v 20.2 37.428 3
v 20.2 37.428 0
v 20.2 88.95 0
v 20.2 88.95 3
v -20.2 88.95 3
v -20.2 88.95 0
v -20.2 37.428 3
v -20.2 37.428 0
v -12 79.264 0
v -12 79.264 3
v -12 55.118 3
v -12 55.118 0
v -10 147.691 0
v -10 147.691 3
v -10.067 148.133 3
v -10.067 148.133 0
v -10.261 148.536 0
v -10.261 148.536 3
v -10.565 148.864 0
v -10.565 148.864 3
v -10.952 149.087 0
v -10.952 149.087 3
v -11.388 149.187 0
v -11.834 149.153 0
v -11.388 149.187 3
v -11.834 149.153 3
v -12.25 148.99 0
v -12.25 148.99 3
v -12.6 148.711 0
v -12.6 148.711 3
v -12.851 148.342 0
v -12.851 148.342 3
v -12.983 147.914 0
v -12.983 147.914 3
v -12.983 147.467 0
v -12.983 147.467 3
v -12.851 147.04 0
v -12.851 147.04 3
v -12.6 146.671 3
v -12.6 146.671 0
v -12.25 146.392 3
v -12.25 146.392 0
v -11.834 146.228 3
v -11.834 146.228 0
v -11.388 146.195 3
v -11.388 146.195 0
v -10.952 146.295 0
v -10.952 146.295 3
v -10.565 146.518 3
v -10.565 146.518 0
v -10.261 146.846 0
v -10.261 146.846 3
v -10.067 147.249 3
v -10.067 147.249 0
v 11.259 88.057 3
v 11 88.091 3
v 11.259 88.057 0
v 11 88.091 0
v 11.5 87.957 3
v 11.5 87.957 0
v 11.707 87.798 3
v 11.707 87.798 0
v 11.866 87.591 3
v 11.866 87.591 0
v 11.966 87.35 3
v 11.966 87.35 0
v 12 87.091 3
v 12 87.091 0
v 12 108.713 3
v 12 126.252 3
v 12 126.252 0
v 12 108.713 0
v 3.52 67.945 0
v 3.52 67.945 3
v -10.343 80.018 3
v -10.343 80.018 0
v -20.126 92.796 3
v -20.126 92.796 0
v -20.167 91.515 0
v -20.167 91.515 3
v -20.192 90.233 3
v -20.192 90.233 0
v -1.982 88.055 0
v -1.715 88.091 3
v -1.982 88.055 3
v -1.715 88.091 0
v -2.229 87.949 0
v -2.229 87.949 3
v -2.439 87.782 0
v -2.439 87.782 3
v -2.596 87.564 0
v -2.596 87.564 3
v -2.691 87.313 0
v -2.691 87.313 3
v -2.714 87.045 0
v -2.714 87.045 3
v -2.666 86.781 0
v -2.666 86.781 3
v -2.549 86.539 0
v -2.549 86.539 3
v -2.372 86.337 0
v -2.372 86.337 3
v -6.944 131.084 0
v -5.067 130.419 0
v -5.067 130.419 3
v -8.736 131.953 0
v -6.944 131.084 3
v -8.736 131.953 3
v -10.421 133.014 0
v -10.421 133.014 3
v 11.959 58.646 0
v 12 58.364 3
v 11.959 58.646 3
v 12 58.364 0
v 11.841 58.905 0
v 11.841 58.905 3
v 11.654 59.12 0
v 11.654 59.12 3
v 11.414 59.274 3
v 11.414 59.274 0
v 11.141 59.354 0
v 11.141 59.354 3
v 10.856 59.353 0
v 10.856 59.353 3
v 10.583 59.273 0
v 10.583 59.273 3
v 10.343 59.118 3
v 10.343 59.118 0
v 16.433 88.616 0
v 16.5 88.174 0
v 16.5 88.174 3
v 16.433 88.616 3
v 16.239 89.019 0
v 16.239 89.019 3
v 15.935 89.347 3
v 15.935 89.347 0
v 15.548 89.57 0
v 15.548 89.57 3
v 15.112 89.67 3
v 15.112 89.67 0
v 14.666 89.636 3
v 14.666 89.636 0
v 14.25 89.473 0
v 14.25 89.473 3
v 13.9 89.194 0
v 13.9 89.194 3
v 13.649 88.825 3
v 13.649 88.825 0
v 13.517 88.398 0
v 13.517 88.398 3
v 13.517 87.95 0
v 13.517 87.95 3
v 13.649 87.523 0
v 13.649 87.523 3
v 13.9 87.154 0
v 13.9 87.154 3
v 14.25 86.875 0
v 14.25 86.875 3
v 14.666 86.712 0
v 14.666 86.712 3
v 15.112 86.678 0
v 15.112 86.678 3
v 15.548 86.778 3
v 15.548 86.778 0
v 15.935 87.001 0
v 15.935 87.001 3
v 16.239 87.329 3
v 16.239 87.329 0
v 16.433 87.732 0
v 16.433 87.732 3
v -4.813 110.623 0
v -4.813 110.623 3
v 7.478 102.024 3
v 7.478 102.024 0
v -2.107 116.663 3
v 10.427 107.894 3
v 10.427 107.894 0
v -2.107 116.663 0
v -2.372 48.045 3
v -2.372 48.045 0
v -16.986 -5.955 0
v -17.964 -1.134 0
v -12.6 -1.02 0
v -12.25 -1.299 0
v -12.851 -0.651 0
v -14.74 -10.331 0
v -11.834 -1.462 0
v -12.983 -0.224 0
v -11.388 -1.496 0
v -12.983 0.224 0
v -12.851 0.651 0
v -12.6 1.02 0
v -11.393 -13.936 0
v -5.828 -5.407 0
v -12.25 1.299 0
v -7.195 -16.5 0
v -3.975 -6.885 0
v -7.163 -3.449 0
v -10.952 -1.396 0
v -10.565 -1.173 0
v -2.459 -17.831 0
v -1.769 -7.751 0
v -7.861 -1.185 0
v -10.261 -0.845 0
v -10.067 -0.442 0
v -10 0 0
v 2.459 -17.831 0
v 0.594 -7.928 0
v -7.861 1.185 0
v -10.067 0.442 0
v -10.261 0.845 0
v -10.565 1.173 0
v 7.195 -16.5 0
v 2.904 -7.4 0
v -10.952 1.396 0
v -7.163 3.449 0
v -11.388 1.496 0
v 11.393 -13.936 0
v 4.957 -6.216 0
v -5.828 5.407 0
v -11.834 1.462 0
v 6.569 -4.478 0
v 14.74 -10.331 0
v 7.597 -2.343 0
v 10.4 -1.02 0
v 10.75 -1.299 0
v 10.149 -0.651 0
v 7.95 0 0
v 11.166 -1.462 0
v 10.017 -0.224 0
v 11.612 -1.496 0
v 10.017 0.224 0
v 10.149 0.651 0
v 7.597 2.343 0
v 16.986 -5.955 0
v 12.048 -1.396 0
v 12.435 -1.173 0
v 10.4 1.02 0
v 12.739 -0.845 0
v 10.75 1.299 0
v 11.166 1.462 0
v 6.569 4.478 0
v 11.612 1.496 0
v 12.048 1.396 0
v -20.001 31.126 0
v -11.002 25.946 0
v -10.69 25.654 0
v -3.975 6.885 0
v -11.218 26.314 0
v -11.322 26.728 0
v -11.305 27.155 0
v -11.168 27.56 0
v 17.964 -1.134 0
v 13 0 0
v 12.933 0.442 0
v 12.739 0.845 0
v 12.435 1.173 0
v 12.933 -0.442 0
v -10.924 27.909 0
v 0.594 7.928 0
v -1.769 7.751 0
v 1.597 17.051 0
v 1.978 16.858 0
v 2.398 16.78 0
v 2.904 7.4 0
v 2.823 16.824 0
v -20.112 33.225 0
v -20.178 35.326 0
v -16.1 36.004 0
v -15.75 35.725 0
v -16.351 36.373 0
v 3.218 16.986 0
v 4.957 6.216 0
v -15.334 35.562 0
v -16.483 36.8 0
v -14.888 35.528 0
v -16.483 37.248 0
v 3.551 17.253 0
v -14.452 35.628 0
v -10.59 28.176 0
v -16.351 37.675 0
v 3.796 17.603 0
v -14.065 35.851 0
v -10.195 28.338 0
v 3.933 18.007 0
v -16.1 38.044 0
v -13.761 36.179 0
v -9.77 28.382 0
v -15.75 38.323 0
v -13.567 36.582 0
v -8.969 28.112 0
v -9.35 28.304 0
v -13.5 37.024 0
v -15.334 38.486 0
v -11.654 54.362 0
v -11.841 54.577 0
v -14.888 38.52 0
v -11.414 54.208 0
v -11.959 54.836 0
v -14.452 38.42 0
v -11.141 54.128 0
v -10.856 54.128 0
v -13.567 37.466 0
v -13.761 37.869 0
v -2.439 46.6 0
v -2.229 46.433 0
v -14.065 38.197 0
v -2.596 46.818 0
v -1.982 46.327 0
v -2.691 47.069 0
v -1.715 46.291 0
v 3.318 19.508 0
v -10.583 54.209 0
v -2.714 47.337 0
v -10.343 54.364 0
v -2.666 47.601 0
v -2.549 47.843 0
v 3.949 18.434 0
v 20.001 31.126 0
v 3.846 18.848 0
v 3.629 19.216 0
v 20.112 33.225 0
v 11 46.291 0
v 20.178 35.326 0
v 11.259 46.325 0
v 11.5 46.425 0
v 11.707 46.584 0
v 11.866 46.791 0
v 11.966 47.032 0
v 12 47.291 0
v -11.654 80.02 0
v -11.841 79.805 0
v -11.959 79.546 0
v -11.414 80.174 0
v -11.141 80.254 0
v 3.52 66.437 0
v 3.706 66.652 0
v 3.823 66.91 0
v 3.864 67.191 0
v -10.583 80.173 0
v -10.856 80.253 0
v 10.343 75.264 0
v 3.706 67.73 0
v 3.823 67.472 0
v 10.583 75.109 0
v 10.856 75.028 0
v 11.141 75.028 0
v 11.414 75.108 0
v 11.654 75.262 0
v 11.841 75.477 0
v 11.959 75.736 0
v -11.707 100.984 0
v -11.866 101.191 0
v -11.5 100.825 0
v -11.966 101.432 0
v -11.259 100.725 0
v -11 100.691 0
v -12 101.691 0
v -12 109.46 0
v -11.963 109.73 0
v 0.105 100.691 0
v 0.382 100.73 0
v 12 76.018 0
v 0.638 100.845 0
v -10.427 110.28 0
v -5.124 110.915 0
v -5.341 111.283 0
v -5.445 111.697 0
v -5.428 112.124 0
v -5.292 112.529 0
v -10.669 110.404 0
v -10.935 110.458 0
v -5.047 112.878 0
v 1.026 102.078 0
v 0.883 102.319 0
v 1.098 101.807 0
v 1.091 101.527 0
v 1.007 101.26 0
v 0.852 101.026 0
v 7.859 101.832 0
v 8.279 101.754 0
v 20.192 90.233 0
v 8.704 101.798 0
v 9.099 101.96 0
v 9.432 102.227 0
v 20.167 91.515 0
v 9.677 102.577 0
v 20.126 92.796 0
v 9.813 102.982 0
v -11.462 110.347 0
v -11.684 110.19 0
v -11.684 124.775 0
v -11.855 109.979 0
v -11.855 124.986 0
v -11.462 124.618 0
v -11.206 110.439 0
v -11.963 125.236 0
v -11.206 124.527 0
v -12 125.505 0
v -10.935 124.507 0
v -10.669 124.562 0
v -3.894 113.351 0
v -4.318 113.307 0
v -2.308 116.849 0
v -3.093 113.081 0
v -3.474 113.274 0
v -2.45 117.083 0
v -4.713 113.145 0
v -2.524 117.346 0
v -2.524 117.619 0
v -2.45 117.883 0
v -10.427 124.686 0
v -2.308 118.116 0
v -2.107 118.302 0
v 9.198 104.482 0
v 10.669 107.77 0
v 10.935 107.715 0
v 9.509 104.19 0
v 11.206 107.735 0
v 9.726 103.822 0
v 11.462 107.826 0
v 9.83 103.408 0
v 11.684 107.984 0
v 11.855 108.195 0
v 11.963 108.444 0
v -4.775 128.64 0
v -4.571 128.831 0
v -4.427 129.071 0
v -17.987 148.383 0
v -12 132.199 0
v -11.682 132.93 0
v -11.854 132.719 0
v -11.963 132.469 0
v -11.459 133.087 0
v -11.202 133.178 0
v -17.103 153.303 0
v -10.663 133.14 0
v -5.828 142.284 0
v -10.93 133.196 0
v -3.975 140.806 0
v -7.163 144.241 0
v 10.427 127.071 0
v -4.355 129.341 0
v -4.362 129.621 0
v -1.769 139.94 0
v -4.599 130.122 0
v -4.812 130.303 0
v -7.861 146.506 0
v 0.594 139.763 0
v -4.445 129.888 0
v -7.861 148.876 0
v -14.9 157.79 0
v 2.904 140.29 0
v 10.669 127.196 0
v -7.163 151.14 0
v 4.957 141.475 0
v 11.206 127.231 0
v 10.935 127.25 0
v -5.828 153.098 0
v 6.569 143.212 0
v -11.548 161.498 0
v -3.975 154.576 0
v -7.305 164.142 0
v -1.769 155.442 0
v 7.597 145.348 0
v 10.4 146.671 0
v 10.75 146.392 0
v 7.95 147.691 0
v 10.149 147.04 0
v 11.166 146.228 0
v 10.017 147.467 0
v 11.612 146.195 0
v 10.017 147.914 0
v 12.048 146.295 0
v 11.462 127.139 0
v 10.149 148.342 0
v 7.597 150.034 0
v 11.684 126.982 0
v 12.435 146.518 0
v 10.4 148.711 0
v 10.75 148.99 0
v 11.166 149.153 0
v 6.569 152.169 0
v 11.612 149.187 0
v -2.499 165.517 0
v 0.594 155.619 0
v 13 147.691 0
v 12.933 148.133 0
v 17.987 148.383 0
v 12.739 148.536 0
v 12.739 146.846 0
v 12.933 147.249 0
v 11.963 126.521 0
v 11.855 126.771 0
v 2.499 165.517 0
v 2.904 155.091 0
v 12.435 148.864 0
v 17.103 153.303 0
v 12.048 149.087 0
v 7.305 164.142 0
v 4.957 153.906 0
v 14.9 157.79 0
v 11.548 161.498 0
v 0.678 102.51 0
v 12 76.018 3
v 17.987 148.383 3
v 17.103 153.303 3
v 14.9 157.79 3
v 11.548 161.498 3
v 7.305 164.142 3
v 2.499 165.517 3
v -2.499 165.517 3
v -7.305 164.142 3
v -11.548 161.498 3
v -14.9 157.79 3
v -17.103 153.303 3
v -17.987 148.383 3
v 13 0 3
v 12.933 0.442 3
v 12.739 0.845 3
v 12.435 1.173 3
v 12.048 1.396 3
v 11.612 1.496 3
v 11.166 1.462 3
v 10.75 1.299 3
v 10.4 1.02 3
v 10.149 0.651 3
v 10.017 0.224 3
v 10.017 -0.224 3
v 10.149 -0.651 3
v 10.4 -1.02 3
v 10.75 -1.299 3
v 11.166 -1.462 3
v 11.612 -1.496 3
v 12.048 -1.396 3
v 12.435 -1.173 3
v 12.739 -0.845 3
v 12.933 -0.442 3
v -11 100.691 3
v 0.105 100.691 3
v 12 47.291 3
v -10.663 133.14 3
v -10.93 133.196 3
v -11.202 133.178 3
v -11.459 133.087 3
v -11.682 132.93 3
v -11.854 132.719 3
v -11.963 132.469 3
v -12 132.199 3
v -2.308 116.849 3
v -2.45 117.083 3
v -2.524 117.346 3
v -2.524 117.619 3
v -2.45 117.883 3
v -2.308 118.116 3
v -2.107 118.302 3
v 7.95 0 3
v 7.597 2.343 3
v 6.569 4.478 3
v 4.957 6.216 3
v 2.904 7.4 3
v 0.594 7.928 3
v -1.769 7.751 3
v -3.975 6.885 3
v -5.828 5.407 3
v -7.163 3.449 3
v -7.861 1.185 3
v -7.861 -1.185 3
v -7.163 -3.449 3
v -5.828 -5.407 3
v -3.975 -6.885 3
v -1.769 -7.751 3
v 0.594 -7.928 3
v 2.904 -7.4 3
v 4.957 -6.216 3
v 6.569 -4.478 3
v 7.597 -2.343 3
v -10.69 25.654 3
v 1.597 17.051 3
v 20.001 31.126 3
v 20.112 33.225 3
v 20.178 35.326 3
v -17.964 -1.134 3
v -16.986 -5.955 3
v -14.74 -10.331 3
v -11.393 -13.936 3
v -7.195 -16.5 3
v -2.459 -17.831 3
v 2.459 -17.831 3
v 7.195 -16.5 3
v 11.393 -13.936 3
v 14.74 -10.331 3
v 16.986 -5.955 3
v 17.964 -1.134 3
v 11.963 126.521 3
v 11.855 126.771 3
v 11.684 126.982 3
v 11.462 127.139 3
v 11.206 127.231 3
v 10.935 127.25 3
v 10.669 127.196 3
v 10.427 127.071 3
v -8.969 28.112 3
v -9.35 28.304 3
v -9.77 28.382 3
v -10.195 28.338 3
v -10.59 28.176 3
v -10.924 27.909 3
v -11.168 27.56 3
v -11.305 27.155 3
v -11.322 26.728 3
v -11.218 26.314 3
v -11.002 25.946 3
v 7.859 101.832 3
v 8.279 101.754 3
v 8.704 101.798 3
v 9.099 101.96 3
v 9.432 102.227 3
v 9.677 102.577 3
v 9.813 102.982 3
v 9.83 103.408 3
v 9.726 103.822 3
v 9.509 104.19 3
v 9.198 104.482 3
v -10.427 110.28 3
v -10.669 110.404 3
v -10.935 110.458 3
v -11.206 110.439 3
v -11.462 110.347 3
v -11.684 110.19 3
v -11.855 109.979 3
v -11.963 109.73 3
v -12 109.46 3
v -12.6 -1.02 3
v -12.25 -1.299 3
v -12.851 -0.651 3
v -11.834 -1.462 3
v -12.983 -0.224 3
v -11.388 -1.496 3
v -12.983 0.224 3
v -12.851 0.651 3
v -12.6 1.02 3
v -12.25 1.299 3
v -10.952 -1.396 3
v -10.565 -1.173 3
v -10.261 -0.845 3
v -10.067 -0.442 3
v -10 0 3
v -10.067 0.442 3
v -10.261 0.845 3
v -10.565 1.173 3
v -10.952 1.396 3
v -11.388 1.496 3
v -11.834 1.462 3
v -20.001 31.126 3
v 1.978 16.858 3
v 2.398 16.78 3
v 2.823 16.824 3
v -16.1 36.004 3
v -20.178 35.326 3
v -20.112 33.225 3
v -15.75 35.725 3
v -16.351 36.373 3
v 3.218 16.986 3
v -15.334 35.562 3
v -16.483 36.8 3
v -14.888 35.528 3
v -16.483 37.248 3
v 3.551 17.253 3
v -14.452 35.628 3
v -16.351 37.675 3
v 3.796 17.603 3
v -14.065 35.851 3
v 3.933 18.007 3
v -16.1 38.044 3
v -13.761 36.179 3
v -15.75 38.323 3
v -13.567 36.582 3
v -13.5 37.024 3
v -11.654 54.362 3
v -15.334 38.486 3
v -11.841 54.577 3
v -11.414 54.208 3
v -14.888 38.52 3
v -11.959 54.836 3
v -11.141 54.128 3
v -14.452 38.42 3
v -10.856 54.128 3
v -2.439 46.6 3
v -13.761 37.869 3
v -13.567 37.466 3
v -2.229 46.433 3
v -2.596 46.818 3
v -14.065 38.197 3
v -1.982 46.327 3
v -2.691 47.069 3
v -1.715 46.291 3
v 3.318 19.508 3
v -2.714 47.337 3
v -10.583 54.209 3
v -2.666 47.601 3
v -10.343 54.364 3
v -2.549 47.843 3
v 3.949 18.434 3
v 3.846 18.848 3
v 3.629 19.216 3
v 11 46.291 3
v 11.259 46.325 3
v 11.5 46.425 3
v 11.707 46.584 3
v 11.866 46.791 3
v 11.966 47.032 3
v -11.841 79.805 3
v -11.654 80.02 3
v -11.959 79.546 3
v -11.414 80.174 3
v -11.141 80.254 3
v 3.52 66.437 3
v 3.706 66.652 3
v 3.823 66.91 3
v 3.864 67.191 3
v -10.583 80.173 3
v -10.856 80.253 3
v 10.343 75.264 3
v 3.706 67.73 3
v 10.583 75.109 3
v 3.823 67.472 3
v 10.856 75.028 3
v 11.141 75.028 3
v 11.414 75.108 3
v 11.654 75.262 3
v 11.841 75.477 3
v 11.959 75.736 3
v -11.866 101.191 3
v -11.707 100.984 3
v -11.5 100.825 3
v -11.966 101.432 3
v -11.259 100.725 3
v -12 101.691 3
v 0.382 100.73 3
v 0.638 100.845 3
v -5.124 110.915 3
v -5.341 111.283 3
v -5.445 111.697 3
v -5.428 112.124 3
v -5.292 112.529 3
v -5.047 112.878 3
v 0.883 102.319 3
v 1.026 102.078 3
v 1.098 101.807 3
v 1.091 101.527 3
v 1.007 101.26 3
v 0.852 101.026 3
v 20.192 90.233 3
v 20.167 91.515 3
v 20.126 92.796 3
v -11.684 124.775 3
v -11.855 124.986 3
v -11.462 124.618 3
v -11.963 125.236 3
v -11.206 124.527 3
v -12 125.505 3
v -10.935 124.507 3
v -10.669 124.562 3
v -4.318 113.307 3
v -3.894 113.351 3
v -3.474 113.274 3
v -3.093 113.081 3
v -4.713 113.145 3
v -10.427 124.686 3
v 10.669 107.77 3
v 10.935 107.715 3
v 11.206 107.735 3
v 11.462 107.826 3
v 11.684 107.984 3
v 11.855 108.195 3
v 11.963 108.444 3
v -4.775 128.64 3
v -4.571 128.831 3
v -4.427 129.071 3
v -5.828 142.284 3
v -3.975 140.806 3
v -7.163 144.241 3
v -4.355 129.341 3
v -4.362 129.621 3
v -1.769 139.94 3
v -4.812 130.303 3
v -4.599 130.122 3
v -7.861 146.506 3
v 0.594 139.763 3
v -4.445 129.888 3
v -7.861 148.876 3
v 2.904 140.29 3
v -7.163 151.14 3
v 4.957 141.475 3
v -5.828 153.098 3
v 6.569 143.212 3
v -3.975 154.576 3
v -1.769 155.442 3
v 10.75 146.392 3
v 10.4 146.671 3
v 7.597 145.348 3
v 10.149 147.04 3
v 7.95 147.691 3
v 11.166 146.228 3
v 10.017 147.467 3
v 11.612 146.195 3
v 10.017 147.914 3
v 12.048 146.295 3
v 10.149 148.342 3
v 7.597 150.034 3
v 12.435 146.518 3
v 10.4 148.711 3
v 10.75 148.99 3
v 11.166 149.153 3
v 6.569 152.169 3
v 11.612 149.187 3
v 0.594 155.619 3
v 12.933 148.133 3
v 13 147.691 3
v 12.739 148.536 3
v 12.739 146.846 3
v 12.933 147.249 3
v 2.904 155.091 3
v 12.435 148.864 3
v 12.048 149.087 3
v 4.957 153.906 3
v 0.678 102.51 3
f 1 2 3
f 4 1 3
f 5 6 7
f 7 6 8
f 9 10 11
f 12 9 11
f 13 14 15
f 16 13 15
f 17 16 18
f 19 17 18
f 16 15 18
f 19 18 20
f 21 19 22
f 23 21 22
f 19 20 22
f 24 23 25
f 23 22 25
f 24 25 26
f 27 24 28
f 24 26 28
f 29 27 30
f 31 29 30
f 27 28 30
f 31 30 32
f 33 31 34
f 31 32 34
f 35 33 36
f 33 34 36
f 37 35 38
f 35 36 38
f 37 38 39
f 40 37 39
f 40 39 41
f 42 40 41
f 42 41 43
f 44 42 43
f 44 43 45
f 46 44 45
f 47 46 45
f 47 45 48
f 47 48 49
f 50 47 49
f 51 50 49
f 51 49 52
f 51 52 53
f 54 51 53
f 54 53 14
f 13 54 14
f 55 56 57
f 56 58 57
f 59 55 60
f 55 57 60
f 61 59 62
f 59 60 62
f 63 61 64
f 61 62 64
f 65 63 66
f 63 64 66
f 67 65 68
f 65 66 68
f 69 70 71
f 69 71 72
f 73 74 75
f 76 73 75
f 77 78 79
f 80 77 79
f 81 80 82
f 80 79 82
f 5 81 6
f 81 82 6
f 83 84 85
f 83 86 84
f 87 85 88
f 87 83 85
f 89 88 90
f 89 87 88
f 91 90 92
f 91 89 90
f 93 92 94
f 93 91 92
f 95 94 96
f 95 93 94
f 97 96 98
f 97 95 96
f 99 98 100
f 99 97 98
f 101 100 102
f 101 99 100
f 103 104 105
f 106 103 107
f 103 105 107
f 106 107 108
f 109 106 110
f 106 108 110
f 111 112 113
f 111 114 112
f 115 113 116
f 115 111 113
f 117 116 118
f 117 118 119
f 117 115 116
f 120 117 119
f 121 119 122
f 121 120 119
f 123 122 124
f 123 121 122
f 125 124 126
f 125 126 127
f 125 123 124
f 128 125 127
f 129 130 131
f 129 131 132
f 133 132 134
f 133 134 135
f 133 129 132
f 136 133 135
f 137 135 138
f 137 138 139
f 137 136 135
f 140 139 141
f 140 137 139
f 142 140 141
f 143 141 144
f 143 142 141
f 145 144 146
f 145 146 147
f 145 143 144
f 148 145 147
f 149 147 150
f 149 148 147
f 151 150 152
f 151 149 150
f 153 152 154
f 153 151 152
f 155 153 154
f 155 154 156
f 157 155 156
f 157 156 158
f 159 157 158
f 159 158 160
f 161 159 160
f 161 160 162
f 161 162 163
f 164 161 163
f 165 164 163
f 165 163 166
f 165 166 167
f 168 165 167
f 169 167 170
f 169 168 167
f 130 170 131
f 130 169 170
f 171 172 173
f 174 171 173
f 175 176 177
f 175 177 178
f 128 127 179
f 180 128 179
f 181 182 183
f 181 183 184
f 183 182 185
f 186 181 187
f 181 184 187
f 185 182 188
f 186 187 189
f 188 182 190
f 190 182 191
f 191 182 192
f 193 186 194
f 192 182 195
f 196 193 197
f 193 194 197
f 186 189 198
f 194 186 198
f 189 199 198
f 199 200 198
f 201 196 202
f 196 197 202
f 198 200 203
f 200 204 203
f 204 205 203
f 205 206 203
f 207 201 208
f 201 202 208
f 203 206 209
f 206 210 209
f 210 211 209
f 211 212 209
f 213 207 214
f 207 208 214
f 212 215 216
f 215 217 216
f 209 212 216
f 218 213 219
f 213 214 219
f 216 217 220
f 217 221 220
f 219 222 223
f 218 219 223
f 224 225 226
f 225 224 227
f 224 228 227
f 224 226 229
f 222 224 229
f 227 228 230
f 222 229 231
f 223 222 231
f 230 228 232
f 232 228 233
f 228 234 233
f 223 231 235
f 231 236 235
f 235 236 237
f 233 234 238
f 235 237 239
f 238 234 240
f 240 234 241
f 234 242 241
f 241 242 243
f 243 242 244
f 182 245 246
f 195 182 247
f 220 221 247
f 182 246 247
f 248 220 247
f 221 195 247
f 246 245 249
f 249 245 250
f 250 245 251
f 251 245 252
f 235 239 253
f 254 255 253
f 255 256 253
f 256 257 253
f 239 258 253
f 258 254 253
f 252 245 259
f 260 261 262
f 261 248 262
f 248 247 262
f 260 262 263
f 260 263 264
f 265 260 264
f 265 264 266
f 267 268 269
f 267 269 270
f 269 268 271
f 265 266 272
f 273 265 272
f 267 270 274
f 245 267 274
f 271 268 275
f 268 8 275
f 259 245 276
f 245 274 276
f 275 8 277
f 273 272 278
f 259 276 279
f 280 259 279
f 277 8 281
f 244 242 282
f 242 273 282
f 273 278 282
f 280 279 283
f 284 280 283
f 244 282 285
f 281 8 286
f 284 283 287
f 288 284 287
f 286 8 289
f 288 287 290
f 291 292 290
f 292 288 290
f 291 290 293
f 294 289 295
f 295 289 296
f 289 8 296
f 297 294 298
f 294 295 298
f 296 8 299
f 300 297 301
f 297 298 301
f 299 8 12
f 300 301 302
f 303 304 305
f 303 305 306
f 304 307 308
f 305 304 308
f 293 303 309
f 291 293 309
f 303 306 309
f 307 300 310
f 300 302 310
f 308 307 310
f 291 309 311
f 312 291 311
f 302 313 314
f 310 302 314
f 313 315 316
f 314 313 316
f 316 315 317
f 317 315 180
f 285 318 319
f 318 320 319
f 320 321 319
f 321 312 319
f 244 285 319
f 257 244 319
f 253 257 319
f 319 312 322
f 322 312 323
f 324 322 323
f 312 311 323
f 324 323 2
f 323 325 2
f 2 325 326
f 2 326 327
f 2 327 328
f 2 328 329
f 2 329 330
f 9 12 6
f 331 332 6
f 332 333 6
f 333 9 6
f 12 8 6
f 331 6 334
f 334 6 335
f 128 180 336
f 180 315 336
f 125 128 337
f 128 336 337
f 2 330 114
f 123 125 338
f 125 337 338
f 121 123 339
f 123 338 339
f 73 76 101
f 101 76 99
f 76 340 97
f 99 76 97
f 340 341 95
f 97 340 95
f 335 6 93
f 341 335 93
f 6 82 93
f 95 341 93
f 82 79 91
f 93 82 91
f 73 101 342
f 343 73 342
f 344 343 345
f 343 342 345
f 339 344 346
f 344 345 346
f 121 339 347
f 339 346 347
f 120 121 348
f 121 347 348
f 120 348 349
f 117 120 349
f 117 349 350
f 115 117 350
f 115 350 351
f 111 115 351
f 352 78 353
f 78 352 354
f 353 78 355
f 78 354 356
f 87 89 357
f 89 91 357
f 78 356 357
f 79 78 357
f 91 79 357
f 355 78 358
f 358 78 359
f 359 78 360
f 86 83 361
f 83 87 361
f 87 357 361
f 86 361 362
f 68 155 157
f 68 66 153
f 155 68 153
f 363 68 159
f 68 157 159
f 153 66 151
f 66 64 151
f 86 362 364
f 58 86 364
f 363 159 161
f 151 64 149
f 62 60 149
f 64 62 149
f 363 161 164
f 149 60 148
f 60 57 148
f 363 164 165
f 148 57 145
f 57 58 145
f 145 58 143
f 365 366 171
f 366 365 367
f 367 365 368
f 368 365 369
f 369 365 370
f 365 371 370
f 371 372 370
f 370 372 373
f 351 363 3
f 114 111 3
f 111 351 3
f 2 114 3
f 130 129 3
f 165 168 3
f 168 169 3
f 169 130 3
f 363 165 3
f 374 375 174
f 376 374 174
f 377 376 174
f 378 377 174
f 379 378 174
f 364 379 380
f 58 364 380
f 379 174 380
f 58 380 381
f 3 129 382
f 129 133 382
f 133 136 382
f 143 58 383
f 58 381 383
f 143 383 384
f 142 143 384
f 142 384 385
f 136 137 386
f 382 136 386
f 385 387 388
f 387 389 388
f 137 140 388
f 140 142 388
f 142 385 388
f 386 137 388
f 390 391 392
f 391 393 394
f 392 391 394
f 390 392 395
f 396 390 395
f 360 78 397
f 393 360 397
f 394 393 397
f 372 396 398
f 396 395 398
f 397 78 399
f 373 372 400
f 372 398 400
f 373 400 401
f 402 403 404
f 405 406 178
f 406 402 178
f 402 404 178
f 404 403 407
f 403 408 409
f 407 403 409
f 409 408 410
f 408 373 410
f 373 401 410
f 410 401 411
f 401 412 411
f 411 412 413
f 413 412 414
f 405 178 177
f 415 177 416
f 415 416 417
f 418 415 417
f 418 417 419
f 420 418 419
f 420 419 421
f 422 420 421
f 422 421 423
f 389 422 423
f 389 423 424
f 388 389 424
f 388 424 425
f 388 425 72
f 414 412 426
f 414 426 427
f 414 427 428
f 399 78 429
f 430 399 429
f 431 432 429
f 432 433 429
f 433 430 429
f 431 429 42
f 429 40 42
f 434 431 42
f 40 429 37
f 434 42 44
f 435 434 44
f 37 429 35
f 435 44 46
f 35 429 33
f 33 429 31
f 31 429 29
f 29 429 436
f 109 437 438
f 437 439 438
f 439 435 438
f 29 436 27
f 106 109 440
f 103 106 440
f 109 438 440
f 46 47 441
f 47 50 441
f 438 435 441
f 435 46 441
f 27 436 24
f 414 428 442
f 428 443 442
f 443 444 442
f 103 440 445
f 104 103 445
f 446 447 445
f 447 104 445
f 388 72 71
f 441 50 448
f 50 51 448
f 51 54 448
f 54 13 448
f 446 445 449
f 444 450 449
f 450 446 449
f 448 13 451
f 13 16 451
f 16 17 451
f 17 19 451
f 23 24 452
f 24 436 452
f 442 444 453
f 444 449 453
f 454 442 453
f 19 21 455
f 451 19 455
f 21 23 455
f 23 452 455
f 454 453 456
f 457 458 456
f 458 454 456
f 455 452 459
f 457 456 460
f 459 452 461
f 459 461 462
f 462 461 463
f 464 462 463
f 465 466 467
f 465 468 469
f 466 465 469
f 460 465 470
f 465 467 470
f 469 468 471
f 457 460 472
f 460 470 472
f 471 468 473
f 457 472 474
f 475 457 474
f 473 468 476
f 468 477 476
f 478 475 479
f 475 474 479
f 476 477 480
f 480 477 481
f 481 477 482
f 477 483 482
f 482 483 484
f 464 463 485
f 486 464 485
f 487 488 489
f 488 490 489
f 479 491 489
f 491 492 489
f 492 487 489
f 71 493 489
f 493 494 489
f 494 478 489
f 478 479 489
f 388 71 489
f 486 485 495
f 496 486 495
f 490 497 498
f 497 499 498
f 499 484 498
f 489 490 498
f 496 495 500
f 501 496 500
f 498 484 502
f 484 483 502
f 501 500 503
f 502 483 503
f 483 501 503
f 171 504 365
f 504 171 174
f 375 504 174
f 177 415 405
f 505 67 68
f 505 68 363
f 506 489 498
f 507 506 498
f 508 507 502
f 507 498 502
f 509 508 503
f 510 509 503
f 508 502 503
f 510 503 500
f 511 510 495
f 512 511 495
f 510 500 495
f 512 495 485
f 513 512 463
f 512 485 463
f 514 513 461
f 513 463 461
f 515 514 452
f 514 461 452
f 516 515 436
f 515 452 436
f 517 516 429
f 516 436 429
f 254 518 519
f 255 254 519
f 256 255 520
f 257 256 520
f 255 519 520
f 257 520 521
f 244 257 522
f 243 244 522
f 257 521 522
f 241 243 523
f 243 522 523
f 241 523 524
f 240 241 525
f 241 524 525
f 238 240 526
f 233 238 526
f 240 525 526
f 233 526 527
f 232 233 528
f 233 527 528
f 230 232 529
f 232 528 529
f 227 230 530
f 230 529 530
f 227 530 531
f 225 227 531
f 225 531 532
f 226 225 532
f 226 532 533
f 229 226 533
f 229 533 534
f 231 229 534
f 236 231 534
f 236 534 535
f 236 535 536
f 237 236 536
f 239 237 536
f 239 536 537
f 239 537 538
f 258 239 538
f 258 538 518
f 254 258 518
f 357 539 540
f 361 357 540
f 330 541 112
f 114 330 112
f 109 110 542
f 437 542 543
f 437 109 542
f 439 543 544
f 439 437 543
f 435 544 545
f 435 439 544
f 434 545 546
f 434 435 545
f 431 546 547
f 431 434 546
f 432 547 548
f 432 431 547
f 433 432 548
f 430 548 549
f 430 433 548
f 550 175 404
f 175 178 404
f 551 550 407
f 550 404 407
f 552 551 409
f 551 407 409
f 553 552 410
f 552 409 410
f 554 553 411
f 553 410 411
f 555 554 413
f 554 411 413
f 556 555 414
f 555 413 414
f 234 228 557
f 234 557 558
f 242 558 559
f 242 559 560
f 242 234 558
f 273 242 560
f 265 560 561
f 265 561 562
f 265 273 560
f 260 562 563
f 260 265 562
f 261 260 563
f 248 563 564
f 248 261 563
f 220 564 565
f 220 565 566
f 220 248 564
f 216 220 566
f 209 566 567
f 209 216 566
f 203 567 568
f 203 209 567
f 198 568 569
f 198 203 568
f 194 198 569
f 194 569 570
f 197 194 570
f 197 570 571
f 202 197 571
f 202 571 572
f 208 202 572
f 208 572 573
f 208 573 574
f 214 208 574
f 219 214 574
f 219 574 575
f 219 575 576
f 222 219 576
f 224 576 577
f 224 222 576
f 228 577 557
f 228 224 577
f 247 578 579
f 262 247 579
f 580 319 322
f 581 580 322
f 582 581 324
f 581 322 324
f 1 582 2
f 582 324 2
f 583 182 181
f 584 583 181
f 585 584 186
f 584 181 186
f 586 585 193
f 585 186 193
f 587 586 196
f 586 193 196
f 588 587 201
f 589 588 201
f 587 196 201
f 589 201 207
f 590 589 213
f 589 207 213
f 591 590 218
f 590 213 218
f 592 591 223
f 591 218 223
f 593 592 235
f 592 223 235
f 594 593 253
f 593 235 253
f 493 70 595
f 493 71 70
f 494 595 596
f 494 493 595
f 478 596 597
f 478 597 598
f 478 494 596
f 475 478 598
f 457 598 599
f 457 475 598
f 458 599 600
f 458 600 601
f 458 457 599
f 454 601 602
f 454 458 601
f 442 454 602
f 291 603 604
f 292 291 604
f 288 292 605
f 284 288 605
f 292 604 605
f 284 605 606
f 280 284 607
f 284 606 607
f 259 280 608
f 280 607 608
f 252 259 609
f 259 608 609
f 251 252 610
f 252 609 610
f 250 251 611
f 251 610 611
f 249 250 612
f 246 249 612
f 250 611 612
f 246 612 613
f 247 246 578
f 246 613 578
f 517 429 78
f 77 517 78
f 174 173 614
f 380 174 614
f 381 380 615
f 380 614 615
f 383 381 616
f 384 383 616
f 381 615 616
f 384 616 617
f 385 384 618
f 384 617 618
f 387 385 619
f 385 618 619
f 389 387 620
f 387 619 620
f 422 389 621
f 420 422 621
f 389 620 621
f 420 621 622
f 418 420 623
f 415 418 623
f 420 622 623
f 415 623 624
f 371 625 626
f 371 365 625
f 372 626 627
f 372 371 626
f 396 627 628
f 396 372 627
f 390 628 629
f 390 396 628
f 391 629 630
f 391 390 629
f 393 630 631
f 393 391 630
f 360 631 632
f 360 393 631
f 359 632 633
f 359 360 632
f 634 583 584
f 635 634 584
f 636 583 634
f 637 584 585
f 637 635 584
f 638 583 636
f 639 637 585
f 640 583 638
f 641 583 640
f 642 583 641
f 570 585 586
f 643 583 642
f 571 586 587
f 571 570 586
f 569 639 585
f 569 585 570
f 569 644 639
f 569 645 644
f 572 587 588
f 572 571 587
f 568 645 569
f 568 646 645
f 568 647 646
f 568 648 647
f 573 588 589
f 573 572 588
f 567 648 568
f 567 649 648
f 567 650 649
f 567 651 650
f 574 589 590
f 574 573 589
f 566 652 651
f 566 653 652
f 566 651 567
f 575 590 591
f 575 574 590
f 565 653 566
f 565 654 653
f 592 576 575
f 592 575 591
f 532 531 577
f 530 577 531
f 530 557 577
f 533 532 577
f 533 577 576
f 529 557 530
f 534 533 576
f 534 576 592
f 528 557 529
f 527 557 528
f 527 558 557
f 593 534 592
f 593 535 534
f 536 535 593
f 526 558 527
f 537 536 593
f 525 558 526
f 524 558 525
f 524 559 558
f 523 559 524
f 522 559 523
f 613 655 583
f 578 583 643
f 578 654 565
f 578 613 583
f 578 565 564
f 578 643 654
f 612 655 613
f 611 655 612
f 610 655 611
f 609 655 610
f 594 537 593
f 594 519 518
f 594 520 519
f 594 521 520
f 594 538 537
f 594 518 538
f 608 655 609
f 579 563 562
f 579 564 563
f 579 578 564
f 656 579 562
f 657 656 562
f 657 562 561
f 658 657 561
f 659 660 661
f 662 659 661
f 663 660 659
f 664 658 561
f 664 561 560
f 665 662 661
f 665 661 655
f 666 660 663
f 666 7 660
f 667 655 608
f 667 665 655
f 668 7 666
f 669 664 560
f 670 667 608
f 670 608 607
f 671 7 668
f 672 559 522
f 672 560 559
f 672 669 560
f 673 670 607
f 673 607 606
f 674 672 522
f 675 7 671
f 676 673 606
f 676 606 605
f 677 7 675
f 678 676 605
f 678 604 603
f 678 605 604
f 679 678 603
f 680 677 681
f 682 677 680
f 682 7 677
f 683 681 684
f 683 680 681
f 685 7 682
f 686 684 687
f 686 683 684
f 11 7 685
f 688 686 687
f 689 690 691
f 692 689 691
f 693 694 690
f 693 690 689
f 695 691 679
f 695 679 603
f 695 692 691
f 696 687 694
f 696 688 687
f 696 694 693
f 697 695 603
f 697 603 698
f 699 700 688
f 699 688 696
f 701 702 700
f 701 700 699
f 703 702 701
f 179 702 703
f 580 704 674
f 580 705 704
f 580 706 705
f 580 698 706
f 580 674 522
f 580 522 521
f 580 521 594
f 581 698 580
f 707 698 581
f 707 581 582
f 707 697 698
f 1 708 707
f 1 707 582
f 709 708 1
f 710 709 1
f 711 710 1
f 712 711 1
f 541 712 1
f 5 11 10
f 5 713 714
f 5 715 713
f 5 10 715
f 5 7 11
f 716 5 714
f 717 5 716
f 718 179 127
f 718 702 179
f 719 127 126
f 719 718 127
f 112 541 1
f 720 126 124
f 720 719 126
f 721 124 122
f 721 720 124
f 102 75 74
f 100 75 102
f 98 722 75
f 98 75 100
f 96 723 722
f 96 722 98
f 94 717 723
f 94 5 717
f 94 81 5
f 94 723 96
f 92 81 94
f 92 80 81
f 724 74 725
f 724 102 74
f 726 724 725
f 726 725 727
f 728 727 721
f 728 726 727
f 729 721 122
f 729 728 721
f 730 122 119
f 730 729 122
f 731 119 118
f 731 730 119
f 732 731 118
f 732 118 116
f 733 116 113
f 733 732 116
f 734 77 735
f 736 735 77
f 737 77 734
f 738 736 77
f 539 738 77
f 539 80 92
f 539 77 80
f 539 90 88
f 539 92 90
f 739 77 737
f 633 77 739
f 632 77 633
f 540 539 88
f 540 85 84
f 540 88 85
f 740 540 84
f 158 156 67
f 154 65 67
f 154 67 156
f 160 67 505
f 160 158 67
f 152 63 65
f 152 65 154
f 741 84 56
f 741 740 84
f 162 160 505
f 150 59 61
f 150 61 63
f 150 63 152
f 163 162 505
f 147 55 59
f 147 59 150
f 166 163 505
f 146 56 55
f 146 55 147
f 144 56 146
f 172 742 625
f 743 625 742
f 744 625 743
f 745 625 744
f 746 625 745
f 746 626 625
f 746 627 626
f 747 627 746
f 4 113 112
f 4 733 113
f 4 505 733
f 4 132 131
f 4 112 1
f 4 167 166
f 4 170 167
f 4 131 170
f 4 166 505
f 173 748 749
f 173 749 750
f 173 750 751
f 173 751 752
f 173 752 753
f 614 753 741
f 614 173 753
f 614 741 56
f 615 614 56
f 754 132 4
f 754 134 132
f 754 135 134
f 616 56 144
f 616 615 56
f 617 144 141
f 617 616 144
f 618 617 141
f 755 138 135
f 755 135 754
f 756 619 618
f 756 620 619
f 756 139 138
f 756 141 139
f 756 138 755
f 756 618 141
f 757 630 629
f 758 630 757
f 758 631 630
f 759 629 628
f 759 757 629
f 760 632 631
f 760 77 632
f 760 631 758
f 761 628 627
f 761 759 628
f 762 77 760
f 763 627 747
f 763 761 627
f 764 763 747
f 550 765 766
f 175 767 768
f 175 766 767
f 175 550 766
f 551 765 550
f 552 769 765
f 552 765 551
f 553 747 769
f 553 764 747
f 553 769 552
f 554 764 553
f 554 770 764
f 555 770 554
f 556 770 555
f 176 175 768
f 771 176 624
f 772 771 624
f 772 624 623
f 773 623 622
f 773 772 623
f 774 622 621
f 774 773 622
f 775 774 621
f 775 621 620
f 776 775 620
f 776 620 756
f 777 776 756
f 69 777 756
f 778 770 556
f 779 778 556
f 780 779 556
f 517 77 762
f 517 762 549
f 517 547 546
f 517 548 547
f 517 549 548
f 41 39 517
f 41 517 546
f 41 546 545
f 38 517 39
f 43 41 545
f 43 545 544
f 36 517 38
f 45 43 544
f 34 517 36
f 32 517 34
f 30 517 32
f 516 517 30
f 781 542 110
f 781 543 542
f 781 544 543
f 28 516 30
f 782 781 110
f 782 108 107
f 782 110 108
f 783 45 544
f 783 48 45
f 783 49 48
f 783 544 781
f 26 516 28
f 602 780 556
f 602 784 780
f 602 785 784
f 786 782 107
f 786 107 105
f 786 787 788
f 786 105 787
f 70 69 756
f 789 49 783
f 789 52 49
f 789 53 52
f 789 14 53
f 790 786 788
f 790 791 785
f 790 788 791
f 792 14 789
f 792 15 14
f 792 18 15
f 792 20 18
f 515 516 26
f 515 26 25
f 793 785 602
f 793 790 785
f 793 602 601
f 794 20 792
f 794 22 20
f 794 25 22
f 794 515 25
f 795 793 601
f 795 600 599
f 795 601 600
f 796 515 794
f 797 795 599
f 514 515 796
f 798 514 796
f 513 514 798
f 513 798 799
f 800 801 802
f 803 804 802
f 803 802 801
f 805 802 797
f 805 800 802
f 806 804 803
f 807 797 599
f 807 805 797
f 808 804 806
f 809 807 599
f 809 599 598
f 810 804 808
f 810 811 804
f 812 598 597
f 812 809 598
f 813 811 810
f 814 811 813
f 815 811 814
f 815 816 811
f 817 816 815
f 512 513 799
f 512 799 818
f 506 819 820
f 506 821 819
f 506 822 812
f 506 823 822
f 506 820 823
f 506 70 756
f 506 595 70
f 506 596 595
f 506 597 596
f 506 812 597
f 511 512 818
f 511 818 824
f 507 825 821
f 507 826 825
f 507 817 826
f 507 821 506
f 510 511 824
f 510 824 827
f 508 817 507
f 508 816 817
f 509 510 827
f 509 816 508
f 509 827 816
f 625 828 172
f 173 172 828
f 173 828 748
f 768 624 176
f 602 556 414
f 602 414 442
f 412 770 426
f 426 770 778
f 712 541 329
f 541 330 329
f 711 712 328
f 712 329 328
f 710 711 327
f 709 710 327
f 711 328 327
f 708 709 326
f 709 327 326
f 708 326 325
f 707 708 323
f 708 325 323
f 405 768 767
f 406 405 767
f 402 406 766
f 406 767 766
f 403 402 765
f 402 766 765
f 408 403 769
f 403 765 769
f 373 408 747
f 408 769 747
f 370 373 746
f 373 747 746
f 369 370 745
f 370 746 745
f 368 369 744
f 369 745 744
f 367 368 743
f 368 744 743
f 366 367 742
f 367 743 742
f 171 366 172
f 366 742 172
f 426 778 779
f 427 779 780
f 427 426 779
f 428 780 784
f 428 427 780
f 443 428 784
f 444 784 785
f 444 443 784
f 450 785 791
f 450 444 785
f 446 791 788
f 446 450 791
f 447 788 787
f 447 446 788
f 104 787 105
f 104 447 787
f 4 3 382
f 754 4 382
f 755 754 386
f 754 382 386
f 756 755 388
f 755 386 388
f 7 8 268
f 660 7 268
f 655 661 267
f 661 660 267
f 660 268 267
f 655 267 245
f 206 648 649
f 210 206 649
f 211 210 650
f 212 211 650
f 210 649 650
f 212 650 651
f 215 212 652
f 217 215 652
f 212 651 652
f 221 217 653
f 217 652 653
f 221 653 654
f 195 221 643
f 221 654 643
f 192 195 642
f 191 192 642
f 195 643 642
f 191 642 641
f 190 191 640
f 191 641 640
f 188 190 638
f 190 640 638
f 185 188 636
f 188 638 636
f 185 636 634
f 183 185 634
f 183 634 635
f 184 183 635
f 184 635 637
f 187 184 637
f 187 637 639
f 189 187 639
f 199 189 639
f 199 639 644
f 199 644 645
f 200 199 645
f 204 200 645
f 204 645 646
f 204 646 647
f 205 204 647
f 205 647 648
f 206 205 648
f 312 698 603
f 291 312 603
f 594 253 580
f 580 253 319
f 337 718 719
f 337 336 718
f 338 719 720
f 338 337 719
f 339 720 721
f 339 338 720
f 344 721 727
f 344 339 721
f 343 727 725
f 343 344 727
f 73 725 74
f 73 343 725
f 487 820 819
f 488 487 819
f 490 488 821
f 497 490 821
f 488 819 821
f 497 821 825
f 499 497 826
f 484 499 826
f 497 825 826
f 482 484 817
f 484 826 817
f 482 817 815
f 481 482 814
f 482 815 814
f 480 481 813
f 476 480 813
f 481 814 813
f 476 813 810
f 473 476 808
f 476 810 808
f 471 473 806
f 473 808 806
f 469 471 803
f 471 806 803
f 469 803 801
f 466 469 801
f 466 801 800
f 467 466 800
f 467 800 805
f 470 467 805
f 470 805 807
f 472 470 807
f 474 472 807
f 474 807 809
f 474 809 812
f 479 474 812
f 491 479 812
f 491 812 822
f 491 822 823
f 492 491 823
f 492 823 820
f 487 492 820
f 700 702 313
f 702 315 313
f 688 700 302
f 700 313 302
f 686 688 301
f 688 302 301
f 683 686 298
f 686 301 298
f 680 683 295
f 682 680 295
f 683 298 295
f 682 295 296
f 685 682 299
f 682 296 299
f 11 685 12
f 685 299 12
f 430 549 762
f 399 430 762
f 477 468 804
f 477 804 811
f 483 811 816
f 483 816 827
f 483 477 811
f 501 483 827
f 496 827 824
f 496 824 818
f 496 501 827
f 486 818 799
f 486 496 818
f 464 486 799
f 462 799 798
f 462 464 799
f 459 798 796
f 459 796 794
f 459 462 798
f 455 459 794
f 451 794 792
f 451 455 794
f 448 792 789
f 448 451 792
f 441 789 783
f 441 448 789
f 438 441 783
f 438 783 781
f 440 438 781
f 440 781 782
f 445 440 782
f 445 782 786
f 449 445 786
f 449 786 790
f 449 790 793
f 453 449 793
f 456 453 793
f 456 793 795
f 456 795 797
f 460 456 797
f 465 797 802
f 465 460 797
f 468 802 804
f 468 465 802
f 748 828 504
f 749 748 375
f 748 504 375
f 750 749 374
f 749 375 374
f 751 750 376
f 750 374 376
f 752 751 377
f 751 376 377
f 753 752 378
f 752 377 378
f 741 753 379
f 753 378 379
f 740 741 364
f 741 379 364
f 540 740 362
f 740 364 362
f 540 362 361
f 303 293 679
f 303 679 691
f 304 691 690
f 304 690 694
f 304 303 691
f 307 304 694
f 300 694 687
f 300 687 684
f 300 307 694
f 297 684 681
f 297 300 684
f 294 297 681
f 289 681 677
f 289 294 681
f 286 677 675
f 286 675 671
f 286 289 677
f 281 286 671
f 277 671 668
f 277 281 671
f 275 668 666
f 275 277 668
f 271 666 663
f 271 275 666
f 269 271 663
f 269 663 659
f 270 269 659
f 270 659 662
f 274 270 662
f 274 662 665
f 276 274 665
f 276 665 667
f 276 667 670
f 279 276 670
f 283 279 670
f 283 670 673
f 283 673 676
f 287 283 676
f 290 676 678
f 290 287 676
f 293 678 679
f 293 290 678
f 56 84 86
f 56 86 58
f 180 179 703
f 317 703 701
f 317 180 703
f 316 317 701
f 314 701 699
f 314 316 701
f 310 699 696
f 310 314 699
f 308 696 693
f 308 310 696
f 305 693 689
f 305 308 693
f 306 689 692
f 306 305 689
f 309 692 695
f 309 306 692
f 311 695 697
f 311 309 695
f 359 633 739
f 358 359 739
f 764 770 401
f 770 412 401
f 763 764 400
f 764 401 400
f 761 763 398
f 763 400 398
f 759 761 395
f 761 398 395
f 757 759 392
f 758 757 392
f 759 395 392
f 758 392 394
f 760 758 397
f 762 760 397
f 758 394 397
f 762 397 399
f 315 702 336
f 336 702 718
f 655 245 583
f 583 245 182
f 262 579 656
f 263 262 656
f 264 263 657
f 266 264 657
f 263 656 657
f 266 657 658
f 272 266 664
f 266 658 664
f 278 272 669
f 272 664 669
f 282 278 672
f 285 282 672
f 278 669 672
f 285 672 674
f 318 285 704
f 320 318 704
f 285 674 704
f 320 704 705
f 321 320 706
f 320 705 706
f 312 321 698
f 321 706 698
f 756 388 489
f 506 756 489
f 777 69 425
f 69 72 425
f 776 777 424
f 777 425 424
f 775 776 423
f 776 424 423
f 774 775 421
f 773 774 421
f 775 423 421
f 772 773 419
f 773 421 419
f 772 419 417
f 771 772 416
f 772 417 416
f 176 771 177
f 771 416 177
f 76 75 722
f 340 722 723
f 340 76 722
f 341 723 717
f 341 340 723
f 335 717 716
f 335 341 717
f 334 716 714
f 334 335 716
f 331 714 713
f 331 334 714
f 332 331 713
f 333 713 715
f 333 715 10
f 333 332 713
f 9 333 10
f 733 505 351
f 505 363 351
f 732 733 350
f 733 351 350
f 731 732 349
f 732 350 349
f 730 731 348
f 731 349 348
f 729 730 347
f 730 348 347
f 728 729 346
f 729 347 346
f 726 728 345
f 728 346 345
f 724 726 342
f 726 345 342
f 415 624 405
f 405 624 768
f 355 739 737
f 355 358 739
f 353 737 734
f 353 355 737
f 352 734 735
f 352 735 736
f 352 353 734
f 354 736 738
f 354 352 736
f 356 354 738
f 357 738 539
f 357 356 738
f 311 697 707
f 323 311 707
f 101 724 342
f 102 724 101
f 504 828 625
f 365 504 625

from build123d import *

# Parameters (mm, degrees)
SKETCH1_R               = 7.95
SKETCH1_R_2             = 1.5
MAIN_BODY_LINK_B1_DEPTH = 3
CUT_EXTRUDE2_REACH      = 168.945
CUT_EXTRUDE3_REACH      = 168.945
SKETCH5_R               = 1.5
PULLEYIDLERUP_DEPTH     = 3
CUT_EXTRUDE5_DEPTH      = 3
FILLET4_R               = 1
FILLET5_R               = 100


with BuildPart() as part:
    # Sketch1 → Main Body Link B1 (new body)
    with BuildSketch(Plane.XY):
        with BuildLine():
            Line((20.2, 41.674052381), (20.2, 83.474052381))
            Line((20.2, 83.474052381), (20.2, 90.874052381))
            Line((20.2, 90.874052381), (17.986683974, 148.383116621))
            ThreePointArc((17.986683974, 148.383116621), (0, 165.690874165), (-17.986683974, 148.383116621))
            Line((-17.986683974, 148.383116621), (-20.2, 90.874052381))
            Line((-20.2, 90.874052381), (-20.2, 83.474052381))
            Line((-20.2, 83.474052381), (-20.2, 41.674052381))
            Line((-20.2, 41.674052381), (-20.2, 34.274052381))
            Line((-20.2, 34.274052381), (-17.964224051, -1.134307826))
            ThreePointArc((-17.964224051, -1.134307826), (0, -18), (17.964224051, -1.134307826))
            Line((17.964224051, -1.134307826), (20.2, 34.274052381))
            Line((20.2, 34.274052381), (20.2, 41.674052381))
        make_face()
        Circle(SKETCH1_R, mode=Mode.SUBTRACT)
        with Locations((15, 88.174052381)):
            Circle(SKETCH1_R_2, mode=Mode.SUBTRACT)
        with Locations((-15, 37.024052381)):
            Circle(SKETCH1_R_2, mode=Mode.SUBTRACT)
        with Locations((0, 147.690874165)):
            Circle(SKETCH1_R, mode=Mode.SUBTRACT)
    extrude(amount=MAIN_BODY_LINK_B1_DEPTH)

    # Sketch4 → Cut-Extrude2 (cut, up to next)
    with BuildSketch(Plane.XY.offset(3), mode=Mode.PRIVATE) as cut_extrude2_sk1:
        with BuildLine():
            Line((-12, 134.2744663), (-12, 123.584968066))
            Line((-12, 123.584968066), (-2.929911079, 129.930929878))
            ThreePointArc((-2.929911079, 129.930929878), (-7.774454217, 131.456408925), (-12, 134.2744663))
        make_face()
    cut_extrude2_tool1 = extrude(cut_extrude2_sk1.sketch, amount=-CUT_EXTRUDE2_REACH, mode=Mode.PRIVATE) & part.part
    # Sketch4 → Cut-Extrude2 (cut, up to next)
    with BuildSketch(Plane.XY.offset(3), mode=Mode.PRIVATE) as cut_extrude2_sk2:
        Polygon((-12, 100.690874165), (3.278172542, 100.690874165), (-12, 111.380372399), align=None)
    cut_extrude2_tool2 = extrude(cut_extrude2_sk2.sketch, amount=-CUT_EXTRUDE2_REACH, mode=Mode.PRIVATE) & part.part
    # Sketch4 → Cut-Extrude2 (cut, up to next)
    with BuildSketch(Plane.XY.offset(3), mode=Mode.PRIVATE) as cut_extrude2_sk3:
        Polygon((12, 128.172168466), (12, 106.793171999), (-3.278172542, 117.482670232), align=None)
    cut_extrude2_tool3 = extrude(cut_extrude2_sk3.sketch, amount=-CUT_EXTRUDE2_REACH, mode=Mode.PRIVATE) & part.part
    # Sketch4 → Cut-Extrude2 (cut, up to next)
    with BuildSketch(Plane.XY.offset(3), mode=Mode.PRIVATE) as cut_extrude2_sk4:
        Polygon((-4.386441158, 88.090874165), (12, 88.090874165), (12, 73.82101499), align=None)
    cut_extrude2_tool4 = extrude(cut_extrude2_sk4.sketch, amount=-CUT_EXTRUDE2_REACH, mode=Mode.PRIVATE) & part.part
    # Sketch4 → Cut-Extrude2 (cut, up to next)
    with BuildSketch(Plane.XY.offset(3), mode=Mode.PRIVATE) as cut_extrude2_sk5:
        Polygon((-12, 81.46073334), (-12, 52.92101499), (4.386441158, 67.190874165), align=None)
    cut_extrude2_tool5 = extrude(cut_extrude2_sk5.sketch, amount=-CUT_EXTRUDE2_REACH, mode=Mode.PRIVATE) & part.part
    # Sketch4 → Cut-Extrude2 (cut, up to next)
    with BuildSketch(Plane.XY.offset(3), mode=Mode.PRIVATE) as cut_extrude2_sk6:
        Polygon((-4.386441158, 46.290874165), (12, 46.290874165), (12, 60.56073334), align=None)
    cut_extrude2_tool6 = extrude(cut_extrude2_sk6.sketch, amount=-CUT_EXTRUDE2_REACH, mode=Mode.PRIVATE) & part.part
    add(cut_extrude2_tool1.solids().sort_by_distance((-9.12997, 128.978342, 3))[0], mode=Mode.SUBTRACT)
    add(cut_extrude2_tool2.solids().sort_by_distance((-6.907276, 104.25404, 3))[0], mode=Mode.SUBTRACT)
    add(cut_extrude2_tool3.solids().sort_by_distance((6.907276, 117.48267, 3))[0], mode=Mode.SUBTRACT)
    add(cut_extrude2_tool4.solids().sort_by_distance((6.537853, 83.334254, 3))[0], mode=Mode.SUBTRACT)
    add(cut_extrude2_tool5.solids().sort_by_distance((-6.537853, 67.190874, 3))[0], mode=Mode.SUBTRACT)
    add(cut_extrude2_tool6.solids().sort_by_distance((6.537853, 51.047494, 3))[0], mode=Mode.SUBTRACT)

    # Sketch5 → Cut-Extrude3 (cut, up to next)
    with BuildSketch(Plane.XY.offset(3), mode=Mode.PRIVATE) as cut_extrude3_sk1:
        with Locations((11.5, 147.690874165)):
            Circle(SKETCH5_R)
    cut_extrude3_tool1 = extrude(cut_extrude3_sk1.sketch, amount=-CUT_EXTRUDE3_REACH, mode=Mode.PRIVATE) & part.part
    # Sketch5 → Cut-Extrude3 (cut, up to next)
    with BuildSketch(Plane.XY.offset(3), mode=Mode.PRIVATE) as cut_extrude3_sk2:
        with Locations((-11.5, 147.690874165)):
            Circle(SKETCH5_R)
    cut_extrude3_tool2 = extrude(cut_extrude3_sk2.sketch, amount=-CUT_EXTRUDE3_REACH, mode=Mode.PRIVATE) & part.part
    # Sketch5 → Cut-Extrude3 (cut, up to next)
    with BuildSketch(Plane.XY.offset(3), mode=Mode.PRIVATE) as cut_extrude3_sk3:
        with Locations((-11.5, 0)):
            Circle(SKETCH5_R)
    cut_extrude3_tool3 = extrude(cut_extrude3_sk3.sketch, amount=-CUT_EXTRUDE3_REACH, mode=Mode.PRIVATE) & part.part
    # Sketch5 → Cut-Extrude3 (cut, up to next)
    with BuildSketch(Plane.XY.offset(3), mode=Mode.PRIVATE) as cut_extrude3_sk4:
        with Locations((11.5, 0)):
            Circle(SKETCH5_R)
    cut_extrude3_tool4 = extrude(cut_extrude3_sk4.sketch, amount=-CUT_EXTRUDE3_REACH, mode=Mode.PRIVATE) & part.part
    add(cut_extrude3_tool1.solids().sort_by_distance((11.5, 147.690874, 3))[0], mode=Mode.SUBTRACT)
    add(cut_extrude3_tool2.solids().sort_by_distance((-11.5, 147.690874, 3))[0], mode=Mode.SUBTRACT)
    add(cut_extrude3_tool3.solids().sort_by_distance((-11.5, 0, 3))[0], mode=Mode.SUBTRACT)
    add(cut_extrude3_tool4.solids().sort_by_distance((11.5, 0, 3))[0], mode=Mode.SUBTRACT)

    # Sketch6 → PulleyIdlerUp (cut)
    with BuildSketch(Plane.XY.offset(3)):
        with BuildLine():
            Line((-4.812543936, 110.623218529), (7.477908291, 102.024103222))
            ThreePointArc((7.477908291, 102.024103222), (9.566865044, 102.393236914), (9.197731352, 104.482193668))
            Line((9.197731352, 104.482193668), (-3.092720875, 113.081308975))
            ThreePointArc((-3.092720875, 113.081308975), (-5.181677628, 112.712175283), (-4.812543936, 110.623218529))
        make_face()
    extrude(amount=-PULLEYIDLERUP_DEPTH, mode=Mode.SUBTRACT)

    # Sketch7 → Cut-Extrude5 (cut)
    with BuildSketch(Plane.XY.offset(3)):
        with BuildLine():
            Line((-10.690189186, 25.65418917), (1.597091478, 17.050542625))
            ThreePointArc((1.597091478, 17.050542625), (3.686184199, 17.418906036), (3.317820787, 19.507998757))
            Line((3.317820787, 19.507998757), (-8.969459877, 28.111645303))
            ThreePointArc((-8.969459877, 28.111645303), (-11.058552598, 27.743281891), (-10.690189186, 25.65418917))
        make_face()
    extrude(amount=-CUT_EXTRUDE5_DEPTH, mode=Mode.SUBTRACT)

    # Fillet4
    fillet4_edges = [part.edges().sort_by_distance(p)[0] for p in [
        (-12, 81.46073334, 1.5),
        (4.386441158, 67.190874165, 1.5),
        (-12, 52.92101499, 1.5),
        (-12, 134.2744663, 1.5),
        (-2.929911079, 129.930929878, 1.5),
        (-12, 123.584968066, 1.5),
        (-12, 100.690874165, 1.5),
        (-12, 111.380372399, 1.5),
        (3.278172542, 100.690874165, 1.5),
        (12, 106.793171999, 1.5),
        (-3.278172542, 117.482670232, 1.5),
        (12, 128.172168466, 1.5),
        (12, 60.56073334, 1.5),
        (12, 46.290874165, 1.5),
        (-4.386441158, 46.290874165, 1.5),
        (12, 88.090874165, 1.5),
        (12, 73.82101499, 1.5),
        (-4.386441158, 88.090874165, 1.5),
    ]]
    fillet(fillet4_edges, radius=FILLET4_R)

    # Fillet5
    # the kernel refuses this fillet: 100 mm, written as the material it takes off along each edge
    with BuildSketch(Plane(origin=(-20.2, 34.274052381, -7.884973578), x_dir=(0, 1, 0), z_dir=(0, 0, 1))) as fillet5_piece_1:
        with BuildLine():
            CenterArc((FILLET5_R * 0.0315398943126, -FILLET5_R), FILLET5_R, 90, 3.613007947)
            Line((-FILLET5_R * 0.0314772071099, -FILLET5_R * 0.00198755271875), (0, 0))
            Line((0, 0), (FILLET5_R * 0.0315398943126, 0))
        make_face()
    extrude(amount=18.769947156, mode=Mode.SUBTRACT)
    with BuildSketch(Plane(origin=(-20.2, 90.874052381, -4.809018086), x_dir=(0.03845791424359976, 0.9992602207793684, 0), z_dir=(0, 0, 1))) as fillet5_piece_2:
        with BuildLine():
            CenterArc((FILLET5_R * 0.0192360723451, -FILLET5_R), FILLET5_R, 90, 2.204019698)
            Line((-FILLET5_R * 0.0192218418985, -FILLET5_R * 0.000739779220632), (0, 0))
            Line((0, 0), (FILLET5_R * 0.0192360723451, 0))
        make_face()
    extrude(amount=12.618036173, mode=Mode.SUBTRACT)
    with BuildSketch(Plane(origin=(20.2, 90.874052381, -4.809018086), x_dir=(-0.03845791424359111, 0.9992602207793686, 0), z_dir=(0, 0, 1))) as fillet5_piece_3:
        with BuildLine():
            CenterArc((FILLET5_R * 0.0192360723451, FILLET5_R), FILLET5_R, 267.795980302, 2.204019698)
            Line((-FILLET5_R * 0.0192218418985, FILLET5_R * 0.000739779220631), (0, 0))
            Line((0, 0), (FILLET5_R * 0.0192360723451, 0))
        make_face()
    extrude(amount=12.618036173, mode=Mode.SUBTRACT)
    with BuildSketch(Plane(origin=(20.2, 34.274052381, -7.884973578), x_dir=(0, 1, 0), z_dir=(0, 0, 1))) as fillet5_piece_4:
        with BuildLine():
            CenterArc((FILLET5_R * 0.0315398943126, FILLET5_R), FILLET5_R, 266.386992053, 3.613007947)
            Line((-FILLET5_R * 0.0314772071099, FILLET5_R * 0.00198755271875), (0, 0))
            Line((0, 0), (FILLET5_R * 0.0315398943126, 0))
        make_face()
    extrude(amount=18.769947156, mode=Mode.SUBTRACT)


solid = part.part
